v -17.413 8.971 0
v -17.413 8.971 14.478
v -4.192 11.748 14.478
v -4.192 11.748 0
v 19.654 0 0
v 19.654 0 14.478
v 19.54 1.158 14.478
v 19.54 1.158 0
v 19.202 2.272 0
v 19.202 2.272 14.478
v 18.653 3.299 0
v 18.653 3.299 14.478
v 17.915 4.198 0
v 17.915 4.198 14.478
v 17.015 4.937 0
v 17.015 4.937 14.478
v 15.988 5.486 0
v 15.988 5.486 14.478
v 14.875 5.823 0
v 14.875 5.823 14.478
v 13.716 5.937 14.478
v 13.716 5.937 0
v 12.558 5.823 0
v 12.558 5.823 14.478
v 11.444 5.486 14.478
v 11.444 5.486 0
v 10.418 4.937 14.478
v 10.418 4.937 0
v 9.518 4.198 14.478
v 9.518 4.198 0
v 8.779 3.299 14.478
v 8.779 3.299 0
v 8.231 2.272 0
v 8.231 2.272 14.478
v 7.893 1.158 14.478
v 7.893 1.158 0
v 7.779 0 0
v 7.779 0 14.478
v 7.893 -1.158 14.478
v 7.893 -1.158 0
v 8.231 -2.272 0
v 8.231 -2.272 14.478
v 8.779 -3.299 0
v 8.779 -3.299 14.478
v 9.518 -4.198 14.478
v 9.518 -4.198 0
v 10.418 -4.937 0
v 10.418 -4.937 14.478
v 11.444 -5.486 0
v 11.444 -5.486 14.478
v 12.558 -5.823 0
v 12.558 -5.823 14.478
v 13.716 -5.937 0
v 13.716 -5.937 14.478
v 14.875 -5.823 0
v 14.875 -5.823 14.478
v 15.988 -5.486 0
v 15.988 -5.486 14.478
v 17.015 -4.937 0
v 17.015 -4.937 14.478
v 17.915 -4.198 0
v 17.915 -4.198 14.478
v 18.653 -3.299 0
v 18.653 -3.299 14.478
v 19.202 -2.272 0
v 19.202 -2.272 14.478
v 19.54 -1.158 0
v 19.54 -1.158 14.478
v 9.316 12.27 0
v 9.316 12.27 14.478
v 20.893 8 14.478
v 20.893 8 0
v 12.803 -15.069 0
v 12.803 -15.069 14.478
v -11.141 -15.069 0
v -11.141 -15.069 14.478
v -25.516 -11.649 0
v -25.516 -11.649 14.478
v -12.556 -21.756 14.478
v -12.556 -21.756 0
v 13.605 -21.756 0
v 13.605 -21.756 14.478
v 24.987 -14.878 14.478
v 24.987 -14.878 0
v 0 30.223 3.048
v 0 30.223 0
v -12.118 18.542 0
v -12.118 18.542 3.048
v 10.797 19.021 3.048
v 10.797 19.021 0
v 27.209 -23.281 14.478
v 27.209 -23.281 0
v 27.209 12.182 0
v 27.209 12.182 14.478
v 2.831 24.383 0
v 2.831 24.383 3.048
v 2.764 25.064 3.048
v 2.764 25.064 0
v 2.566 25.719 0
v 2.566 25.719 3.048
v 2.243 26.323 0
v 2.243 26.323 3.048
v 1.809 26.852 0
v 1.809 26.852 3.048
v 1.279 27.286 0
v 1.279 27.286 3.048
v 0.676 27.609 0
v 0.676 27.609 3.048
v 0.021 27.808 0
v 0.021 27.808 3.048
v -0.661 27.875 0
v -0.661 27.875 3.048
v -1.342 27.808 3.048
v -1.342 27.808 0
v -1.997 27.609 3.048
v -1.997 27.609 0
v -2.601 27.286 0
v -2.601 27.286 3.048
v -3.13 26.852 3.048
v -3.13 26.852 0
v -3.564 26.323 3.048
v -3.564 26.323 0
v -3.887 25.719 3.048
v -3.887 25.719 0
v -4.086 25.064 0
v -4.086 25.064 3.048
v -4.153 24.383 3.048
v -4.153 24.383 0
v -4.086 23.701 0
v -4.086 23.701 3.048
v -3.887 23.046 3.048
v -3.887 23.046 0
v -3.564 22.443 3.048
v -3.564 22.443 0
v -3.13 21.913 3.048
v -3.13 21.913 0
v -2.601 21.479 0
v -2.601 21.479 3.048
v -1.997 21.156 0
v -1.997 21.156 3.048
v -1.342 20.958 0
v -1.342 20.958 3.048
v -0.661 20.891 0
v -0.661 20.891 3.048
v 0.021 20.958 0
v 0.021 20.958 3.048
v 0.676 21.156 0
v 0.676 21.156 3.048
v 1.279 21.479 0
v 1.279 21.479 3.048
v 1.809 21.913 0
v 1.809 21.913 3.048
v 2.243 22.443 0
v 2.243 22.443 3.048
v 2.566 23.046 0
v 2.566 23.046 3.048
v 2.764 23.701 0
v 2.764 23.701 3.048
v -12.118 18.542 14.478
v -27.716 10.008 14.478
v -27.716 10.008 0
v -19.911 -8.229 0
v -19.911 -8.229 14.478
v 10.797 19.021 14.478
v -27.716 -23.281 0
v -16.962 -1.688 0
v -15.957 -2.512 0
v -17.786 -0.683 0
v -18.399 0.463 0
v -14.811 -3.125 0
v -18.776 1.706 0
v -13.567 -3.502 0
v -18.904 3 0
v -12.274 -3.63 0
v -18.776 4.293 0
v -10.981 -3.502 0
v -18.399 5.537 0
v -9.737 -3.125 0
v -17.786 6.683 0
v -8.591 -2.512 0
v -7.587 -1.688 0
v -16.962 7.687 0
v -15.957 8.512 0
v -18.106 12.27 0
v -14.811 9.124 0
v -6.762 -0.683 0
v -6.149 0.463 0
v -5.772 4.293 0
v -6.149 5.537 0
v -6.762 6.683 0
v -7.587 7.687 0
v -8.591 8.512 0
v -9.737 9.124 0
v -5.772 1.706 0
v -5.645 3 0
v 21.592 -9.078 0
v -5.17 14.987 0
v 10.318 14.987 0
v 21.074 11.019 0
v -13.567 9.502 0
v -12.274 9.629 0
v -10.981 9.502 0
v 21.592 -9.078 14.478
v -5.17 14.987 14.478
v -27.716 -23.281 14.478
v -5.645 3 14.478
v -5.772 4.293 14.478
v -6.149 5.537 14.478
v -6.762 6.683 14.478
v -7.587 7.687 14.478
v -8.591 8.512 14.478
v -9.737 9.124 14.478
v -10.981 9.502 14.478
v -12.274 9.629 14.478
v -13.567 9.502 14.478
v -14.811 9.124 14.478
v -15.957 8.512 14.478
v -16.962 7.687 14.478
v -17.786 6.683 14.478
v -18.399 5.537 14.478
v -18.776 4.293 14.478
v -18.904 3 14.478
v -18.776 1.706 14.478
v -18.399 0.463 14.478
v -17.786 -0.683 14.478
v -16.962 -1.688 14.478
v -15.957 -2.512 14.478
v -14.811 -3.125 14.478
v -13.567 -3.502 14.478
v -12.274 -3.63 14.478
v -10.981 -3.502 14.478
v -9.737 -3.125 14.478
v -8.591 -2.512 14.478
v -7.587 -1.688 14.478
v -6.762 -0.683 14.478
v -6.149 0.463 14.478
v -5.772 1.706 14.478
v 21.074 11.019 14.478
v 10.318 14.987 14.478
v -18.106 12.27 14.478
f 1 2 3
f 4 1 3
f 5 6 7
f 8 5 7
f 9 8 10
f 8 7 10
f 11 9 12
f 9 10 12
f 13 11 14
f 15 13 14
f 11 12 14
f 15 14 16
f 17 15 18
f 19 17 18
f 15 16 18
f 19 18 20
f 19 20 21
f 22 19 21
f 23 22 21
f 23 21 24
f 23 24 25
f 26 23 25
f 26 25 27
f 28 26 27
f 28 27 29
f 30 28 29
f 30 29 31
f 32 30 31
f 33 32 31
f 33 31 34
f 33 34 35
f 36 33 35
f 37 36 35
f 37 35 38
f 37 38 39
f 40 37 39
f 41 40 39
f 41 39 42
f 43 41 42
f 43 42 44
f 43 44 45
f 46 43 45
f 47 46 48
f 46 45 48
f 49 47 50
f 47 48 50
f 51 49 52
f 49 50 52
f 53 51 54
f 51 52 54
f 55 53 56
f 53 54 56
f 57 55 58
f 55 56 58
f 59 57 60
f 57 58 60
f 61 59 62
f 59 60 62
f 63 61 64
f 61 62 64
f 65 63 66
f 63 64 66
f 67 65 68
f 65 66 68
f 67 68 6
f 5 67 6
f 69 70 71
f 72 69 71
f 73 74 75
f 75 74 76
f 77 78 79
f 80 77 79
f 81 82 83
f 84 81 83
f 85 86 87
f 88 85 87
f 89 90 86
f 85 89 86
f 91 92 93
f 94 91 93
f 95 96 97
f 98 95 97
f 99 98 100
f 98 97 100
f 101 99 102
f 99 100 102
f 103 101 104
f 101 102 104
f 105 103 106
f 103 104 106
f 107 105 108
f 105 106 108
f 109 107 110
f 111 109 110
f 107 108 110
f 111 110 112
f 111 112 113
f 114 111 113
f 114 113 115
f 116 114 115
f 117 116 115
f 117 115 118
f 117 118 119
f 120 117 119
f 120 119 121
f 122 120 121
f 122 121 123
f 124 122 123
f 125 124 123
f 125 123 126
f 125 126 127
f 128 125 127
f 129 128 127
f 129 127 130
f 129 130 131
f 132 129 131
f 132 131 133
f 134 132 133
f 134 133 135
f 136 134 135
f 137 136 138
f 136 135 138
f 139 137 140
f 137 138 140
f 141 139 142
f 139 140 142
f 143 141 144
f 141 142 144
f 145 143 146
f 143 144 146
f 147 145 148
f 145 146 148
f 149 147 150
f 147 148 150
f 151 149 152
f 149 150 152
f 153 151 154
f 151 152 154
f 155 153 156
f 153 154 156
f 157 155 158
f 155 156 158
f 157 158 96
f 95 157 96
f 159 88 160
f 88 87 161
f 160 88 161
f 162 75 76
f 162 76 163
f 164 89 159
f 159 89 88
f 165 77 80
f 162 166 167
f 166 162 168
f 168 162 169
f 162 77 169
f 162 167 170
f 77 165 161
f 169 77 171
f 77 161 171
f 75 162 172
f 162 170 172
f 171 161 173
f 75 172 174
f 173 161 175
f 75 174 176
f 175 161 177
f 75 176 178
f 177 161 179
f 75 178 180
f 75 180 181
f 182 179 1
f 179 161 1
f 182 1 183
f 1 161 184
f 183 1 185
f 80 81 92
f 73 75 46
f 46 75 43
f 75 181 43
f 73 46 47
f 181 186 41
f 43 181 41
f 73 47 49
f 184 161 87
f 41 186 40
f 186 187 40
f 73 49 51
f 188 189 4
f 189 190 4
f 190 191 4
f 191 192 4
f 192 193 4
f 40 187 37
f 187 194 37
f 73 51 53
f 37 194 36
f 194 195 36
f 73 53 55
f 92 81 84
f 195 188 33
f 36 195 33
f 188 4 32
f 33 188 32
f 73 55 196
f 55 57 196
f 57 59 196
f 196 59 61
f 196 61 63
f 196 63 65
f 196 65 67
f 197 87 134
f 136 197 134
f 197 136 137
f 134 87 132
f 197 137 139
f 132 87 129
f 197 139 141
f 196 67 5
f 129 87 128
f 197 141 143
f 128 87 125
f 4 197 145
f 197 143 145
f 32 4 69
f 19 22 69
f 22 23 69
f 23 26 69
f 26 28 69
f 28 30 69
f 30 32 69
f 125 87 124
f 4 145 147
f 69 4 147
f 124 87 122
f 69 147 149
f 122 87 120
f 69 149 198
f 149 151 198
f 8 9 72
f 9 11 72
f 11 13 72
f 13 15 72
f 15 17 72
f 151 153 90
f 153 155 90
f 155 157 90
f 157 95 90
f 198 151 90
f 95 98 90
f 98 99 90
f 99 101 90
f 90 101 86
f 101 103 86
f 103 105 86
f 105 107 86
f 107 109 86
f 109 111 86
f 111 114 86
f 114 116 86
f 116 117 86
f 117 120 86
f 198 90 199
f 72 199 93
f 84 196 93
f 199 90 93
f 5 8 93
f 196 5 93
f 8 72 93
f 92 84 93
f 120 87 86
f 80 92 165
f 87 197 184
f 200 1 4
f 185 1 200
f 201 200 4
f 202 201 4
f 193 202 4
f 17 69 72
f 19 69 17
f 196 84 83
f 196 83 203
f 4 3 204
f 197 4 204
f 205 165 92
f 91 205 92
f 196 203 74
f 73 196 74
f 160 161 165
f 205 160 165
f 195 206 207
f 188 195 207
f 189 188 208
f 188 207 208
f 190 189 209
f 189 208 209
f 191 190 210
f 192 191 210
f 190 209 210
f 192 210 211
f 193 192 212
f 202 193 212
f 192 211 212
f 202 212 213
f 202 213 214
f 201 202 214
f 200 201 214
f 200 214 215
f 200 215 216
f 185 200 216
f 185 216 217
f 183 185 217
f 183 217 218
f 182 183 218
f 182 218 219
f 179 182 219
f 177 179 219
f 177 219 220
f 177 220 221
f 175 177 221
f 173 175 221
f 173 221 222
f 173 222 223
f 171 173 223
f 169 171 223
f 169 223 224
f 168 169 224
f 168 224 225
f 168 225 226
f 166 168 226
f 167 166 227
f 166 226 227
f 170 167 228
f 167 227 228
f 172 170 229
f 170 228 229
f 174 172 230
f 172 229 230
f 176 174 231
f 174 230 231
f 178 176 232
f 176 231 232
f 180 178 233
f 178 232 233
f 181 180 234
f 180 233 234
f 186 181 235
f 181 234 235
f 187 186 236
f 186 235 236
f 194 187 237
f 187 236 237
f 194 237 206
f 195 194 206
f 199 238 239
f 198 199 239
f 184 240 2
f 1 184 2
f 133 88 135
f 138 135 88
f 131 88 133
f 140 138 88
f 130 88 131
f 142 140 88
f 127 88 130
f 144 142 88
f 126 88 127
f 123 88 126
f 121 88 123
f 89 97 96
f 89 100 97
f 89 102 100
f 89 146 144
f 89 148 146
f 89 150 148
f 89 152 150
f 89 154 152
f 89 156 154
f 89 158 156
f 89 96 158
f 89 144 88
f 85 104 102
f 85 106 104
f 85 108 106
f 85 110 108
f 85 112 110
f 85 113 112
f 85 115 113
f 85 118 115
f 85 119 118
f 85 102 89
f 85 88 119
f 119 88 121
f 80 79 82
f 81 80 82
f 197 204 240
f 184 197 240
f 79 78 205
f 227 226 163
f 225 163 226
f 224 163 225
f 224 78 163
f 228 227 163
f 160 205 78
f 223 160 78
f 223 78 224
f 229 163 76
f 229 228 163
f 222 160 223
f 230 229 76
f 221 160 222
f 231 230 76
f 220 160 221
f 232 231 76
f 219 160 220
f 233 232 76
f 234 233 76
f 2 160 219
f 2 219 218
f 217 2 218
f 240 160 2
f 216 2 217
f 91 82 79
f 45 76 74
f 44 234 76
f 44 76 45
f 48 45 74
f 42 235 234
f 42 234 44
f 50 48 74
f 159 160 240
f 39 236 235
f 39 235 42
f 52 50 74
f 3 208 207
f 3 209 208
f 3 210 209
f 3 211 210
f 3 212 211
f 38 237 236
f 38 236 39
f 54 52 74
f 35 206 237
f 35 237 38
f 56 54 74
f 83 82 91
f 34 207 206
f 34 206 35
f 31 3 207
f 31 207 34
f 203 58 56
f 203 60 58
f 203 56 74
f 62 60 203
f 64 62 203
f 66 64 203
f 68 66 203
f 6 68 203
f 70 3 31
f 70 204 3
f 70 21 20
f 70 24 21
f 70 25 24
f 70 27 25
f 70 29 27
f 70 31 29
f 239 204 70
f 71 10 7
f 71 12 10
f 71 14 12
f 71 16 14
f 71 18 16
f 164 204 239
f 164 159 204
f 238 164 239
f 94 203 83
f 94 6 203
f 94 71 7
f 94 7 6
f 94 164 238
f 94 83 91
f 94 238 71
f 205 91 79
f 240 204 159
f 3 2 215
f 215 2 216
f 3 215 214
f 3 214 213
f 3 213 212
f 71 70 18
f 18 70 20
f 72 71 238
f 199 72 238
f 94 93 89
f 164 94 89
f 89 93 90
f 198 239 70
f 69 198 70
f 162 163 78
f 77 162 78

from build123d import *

# Parameters (mm, degrees)
F1_DEPTH = 14.478
F2_R     = 6.629323
F2_R_2   = 5.937499
F4_DEPTH = 25.4
F5_DEPTH = 25.4
F6_DEPTH = 3.048
F7_R     = 3.492039
F8_DEPTH = 25.4


with BuildPart() as f1:
    # F0 (on Top) → F1 (new body)
    with BuildSketch(Plane.XY):
        Polygon((10.796952, 19.020916), (-12.118302, 18.542465), (-27.716025, 10.007861), (-27.716025, -23.280972), (27.209018, -23.280972), (27.209018, 12.181873), align=None)
    extrude(amount=F1_DEPTH)

    # F2 (on face) → F4 (cut)
    with BuildSketch(Plane.XY.offset(14.478)):
        with Locations((-12.274181, 2.999703)):
            Circle(F2_R)
        with Locations((13.71629, 0)):
            Circle(F2_R_2)
    extrude(amount=-F4_DEPTH, mode=Mode.SUBTRACT)

    # F3 (on face) → F5 (cut)
    with BuildSketch(Plane.XY.offset(14.478)):
        Polygon((-11.141166, -15.069095), (-19.911459, -8.22922), (-25.51602, -11.649158), (-12.556246, -21.756373), (13.60538, -21.756373), (24.986776, -14.877899), (21.591935, -9.078152), (12.803014, -15.069095), align=None)
        Polygon((20.893362, 7.999514), (21.07358, 11.019492), (10.318228, 14.986938), (9.316061, 12.270162), align=None)
        Polygon((-5.16953, 14.986938), (-18.105717, 12.270162), (-17.412947, 8.971472), (-4.192307, 11.747987), align=None)
    extrude(amount=-F5_DEPTH, mode=Mode.SUBTRACT)

    # F0 (on Top) → F6 (join)
    with BuildSketch(Plane.XY):
        Polygon((0, 30.222755), (-12.118302, 18.542465), (10.796952, 19.020916), align=None)
    extrude(amount=F6_DEPTH)

    # F7 (on face) → F8 (cut)
    with BuildSketch(Plane.XY.offset(3.048)):
        with Locations((-0.660675, 24.38261)):
            Circle(F7_R)
    extrude(amount=-F8_DEPTH, mode=Mode.SUBTRACT)


solid = f1.part
